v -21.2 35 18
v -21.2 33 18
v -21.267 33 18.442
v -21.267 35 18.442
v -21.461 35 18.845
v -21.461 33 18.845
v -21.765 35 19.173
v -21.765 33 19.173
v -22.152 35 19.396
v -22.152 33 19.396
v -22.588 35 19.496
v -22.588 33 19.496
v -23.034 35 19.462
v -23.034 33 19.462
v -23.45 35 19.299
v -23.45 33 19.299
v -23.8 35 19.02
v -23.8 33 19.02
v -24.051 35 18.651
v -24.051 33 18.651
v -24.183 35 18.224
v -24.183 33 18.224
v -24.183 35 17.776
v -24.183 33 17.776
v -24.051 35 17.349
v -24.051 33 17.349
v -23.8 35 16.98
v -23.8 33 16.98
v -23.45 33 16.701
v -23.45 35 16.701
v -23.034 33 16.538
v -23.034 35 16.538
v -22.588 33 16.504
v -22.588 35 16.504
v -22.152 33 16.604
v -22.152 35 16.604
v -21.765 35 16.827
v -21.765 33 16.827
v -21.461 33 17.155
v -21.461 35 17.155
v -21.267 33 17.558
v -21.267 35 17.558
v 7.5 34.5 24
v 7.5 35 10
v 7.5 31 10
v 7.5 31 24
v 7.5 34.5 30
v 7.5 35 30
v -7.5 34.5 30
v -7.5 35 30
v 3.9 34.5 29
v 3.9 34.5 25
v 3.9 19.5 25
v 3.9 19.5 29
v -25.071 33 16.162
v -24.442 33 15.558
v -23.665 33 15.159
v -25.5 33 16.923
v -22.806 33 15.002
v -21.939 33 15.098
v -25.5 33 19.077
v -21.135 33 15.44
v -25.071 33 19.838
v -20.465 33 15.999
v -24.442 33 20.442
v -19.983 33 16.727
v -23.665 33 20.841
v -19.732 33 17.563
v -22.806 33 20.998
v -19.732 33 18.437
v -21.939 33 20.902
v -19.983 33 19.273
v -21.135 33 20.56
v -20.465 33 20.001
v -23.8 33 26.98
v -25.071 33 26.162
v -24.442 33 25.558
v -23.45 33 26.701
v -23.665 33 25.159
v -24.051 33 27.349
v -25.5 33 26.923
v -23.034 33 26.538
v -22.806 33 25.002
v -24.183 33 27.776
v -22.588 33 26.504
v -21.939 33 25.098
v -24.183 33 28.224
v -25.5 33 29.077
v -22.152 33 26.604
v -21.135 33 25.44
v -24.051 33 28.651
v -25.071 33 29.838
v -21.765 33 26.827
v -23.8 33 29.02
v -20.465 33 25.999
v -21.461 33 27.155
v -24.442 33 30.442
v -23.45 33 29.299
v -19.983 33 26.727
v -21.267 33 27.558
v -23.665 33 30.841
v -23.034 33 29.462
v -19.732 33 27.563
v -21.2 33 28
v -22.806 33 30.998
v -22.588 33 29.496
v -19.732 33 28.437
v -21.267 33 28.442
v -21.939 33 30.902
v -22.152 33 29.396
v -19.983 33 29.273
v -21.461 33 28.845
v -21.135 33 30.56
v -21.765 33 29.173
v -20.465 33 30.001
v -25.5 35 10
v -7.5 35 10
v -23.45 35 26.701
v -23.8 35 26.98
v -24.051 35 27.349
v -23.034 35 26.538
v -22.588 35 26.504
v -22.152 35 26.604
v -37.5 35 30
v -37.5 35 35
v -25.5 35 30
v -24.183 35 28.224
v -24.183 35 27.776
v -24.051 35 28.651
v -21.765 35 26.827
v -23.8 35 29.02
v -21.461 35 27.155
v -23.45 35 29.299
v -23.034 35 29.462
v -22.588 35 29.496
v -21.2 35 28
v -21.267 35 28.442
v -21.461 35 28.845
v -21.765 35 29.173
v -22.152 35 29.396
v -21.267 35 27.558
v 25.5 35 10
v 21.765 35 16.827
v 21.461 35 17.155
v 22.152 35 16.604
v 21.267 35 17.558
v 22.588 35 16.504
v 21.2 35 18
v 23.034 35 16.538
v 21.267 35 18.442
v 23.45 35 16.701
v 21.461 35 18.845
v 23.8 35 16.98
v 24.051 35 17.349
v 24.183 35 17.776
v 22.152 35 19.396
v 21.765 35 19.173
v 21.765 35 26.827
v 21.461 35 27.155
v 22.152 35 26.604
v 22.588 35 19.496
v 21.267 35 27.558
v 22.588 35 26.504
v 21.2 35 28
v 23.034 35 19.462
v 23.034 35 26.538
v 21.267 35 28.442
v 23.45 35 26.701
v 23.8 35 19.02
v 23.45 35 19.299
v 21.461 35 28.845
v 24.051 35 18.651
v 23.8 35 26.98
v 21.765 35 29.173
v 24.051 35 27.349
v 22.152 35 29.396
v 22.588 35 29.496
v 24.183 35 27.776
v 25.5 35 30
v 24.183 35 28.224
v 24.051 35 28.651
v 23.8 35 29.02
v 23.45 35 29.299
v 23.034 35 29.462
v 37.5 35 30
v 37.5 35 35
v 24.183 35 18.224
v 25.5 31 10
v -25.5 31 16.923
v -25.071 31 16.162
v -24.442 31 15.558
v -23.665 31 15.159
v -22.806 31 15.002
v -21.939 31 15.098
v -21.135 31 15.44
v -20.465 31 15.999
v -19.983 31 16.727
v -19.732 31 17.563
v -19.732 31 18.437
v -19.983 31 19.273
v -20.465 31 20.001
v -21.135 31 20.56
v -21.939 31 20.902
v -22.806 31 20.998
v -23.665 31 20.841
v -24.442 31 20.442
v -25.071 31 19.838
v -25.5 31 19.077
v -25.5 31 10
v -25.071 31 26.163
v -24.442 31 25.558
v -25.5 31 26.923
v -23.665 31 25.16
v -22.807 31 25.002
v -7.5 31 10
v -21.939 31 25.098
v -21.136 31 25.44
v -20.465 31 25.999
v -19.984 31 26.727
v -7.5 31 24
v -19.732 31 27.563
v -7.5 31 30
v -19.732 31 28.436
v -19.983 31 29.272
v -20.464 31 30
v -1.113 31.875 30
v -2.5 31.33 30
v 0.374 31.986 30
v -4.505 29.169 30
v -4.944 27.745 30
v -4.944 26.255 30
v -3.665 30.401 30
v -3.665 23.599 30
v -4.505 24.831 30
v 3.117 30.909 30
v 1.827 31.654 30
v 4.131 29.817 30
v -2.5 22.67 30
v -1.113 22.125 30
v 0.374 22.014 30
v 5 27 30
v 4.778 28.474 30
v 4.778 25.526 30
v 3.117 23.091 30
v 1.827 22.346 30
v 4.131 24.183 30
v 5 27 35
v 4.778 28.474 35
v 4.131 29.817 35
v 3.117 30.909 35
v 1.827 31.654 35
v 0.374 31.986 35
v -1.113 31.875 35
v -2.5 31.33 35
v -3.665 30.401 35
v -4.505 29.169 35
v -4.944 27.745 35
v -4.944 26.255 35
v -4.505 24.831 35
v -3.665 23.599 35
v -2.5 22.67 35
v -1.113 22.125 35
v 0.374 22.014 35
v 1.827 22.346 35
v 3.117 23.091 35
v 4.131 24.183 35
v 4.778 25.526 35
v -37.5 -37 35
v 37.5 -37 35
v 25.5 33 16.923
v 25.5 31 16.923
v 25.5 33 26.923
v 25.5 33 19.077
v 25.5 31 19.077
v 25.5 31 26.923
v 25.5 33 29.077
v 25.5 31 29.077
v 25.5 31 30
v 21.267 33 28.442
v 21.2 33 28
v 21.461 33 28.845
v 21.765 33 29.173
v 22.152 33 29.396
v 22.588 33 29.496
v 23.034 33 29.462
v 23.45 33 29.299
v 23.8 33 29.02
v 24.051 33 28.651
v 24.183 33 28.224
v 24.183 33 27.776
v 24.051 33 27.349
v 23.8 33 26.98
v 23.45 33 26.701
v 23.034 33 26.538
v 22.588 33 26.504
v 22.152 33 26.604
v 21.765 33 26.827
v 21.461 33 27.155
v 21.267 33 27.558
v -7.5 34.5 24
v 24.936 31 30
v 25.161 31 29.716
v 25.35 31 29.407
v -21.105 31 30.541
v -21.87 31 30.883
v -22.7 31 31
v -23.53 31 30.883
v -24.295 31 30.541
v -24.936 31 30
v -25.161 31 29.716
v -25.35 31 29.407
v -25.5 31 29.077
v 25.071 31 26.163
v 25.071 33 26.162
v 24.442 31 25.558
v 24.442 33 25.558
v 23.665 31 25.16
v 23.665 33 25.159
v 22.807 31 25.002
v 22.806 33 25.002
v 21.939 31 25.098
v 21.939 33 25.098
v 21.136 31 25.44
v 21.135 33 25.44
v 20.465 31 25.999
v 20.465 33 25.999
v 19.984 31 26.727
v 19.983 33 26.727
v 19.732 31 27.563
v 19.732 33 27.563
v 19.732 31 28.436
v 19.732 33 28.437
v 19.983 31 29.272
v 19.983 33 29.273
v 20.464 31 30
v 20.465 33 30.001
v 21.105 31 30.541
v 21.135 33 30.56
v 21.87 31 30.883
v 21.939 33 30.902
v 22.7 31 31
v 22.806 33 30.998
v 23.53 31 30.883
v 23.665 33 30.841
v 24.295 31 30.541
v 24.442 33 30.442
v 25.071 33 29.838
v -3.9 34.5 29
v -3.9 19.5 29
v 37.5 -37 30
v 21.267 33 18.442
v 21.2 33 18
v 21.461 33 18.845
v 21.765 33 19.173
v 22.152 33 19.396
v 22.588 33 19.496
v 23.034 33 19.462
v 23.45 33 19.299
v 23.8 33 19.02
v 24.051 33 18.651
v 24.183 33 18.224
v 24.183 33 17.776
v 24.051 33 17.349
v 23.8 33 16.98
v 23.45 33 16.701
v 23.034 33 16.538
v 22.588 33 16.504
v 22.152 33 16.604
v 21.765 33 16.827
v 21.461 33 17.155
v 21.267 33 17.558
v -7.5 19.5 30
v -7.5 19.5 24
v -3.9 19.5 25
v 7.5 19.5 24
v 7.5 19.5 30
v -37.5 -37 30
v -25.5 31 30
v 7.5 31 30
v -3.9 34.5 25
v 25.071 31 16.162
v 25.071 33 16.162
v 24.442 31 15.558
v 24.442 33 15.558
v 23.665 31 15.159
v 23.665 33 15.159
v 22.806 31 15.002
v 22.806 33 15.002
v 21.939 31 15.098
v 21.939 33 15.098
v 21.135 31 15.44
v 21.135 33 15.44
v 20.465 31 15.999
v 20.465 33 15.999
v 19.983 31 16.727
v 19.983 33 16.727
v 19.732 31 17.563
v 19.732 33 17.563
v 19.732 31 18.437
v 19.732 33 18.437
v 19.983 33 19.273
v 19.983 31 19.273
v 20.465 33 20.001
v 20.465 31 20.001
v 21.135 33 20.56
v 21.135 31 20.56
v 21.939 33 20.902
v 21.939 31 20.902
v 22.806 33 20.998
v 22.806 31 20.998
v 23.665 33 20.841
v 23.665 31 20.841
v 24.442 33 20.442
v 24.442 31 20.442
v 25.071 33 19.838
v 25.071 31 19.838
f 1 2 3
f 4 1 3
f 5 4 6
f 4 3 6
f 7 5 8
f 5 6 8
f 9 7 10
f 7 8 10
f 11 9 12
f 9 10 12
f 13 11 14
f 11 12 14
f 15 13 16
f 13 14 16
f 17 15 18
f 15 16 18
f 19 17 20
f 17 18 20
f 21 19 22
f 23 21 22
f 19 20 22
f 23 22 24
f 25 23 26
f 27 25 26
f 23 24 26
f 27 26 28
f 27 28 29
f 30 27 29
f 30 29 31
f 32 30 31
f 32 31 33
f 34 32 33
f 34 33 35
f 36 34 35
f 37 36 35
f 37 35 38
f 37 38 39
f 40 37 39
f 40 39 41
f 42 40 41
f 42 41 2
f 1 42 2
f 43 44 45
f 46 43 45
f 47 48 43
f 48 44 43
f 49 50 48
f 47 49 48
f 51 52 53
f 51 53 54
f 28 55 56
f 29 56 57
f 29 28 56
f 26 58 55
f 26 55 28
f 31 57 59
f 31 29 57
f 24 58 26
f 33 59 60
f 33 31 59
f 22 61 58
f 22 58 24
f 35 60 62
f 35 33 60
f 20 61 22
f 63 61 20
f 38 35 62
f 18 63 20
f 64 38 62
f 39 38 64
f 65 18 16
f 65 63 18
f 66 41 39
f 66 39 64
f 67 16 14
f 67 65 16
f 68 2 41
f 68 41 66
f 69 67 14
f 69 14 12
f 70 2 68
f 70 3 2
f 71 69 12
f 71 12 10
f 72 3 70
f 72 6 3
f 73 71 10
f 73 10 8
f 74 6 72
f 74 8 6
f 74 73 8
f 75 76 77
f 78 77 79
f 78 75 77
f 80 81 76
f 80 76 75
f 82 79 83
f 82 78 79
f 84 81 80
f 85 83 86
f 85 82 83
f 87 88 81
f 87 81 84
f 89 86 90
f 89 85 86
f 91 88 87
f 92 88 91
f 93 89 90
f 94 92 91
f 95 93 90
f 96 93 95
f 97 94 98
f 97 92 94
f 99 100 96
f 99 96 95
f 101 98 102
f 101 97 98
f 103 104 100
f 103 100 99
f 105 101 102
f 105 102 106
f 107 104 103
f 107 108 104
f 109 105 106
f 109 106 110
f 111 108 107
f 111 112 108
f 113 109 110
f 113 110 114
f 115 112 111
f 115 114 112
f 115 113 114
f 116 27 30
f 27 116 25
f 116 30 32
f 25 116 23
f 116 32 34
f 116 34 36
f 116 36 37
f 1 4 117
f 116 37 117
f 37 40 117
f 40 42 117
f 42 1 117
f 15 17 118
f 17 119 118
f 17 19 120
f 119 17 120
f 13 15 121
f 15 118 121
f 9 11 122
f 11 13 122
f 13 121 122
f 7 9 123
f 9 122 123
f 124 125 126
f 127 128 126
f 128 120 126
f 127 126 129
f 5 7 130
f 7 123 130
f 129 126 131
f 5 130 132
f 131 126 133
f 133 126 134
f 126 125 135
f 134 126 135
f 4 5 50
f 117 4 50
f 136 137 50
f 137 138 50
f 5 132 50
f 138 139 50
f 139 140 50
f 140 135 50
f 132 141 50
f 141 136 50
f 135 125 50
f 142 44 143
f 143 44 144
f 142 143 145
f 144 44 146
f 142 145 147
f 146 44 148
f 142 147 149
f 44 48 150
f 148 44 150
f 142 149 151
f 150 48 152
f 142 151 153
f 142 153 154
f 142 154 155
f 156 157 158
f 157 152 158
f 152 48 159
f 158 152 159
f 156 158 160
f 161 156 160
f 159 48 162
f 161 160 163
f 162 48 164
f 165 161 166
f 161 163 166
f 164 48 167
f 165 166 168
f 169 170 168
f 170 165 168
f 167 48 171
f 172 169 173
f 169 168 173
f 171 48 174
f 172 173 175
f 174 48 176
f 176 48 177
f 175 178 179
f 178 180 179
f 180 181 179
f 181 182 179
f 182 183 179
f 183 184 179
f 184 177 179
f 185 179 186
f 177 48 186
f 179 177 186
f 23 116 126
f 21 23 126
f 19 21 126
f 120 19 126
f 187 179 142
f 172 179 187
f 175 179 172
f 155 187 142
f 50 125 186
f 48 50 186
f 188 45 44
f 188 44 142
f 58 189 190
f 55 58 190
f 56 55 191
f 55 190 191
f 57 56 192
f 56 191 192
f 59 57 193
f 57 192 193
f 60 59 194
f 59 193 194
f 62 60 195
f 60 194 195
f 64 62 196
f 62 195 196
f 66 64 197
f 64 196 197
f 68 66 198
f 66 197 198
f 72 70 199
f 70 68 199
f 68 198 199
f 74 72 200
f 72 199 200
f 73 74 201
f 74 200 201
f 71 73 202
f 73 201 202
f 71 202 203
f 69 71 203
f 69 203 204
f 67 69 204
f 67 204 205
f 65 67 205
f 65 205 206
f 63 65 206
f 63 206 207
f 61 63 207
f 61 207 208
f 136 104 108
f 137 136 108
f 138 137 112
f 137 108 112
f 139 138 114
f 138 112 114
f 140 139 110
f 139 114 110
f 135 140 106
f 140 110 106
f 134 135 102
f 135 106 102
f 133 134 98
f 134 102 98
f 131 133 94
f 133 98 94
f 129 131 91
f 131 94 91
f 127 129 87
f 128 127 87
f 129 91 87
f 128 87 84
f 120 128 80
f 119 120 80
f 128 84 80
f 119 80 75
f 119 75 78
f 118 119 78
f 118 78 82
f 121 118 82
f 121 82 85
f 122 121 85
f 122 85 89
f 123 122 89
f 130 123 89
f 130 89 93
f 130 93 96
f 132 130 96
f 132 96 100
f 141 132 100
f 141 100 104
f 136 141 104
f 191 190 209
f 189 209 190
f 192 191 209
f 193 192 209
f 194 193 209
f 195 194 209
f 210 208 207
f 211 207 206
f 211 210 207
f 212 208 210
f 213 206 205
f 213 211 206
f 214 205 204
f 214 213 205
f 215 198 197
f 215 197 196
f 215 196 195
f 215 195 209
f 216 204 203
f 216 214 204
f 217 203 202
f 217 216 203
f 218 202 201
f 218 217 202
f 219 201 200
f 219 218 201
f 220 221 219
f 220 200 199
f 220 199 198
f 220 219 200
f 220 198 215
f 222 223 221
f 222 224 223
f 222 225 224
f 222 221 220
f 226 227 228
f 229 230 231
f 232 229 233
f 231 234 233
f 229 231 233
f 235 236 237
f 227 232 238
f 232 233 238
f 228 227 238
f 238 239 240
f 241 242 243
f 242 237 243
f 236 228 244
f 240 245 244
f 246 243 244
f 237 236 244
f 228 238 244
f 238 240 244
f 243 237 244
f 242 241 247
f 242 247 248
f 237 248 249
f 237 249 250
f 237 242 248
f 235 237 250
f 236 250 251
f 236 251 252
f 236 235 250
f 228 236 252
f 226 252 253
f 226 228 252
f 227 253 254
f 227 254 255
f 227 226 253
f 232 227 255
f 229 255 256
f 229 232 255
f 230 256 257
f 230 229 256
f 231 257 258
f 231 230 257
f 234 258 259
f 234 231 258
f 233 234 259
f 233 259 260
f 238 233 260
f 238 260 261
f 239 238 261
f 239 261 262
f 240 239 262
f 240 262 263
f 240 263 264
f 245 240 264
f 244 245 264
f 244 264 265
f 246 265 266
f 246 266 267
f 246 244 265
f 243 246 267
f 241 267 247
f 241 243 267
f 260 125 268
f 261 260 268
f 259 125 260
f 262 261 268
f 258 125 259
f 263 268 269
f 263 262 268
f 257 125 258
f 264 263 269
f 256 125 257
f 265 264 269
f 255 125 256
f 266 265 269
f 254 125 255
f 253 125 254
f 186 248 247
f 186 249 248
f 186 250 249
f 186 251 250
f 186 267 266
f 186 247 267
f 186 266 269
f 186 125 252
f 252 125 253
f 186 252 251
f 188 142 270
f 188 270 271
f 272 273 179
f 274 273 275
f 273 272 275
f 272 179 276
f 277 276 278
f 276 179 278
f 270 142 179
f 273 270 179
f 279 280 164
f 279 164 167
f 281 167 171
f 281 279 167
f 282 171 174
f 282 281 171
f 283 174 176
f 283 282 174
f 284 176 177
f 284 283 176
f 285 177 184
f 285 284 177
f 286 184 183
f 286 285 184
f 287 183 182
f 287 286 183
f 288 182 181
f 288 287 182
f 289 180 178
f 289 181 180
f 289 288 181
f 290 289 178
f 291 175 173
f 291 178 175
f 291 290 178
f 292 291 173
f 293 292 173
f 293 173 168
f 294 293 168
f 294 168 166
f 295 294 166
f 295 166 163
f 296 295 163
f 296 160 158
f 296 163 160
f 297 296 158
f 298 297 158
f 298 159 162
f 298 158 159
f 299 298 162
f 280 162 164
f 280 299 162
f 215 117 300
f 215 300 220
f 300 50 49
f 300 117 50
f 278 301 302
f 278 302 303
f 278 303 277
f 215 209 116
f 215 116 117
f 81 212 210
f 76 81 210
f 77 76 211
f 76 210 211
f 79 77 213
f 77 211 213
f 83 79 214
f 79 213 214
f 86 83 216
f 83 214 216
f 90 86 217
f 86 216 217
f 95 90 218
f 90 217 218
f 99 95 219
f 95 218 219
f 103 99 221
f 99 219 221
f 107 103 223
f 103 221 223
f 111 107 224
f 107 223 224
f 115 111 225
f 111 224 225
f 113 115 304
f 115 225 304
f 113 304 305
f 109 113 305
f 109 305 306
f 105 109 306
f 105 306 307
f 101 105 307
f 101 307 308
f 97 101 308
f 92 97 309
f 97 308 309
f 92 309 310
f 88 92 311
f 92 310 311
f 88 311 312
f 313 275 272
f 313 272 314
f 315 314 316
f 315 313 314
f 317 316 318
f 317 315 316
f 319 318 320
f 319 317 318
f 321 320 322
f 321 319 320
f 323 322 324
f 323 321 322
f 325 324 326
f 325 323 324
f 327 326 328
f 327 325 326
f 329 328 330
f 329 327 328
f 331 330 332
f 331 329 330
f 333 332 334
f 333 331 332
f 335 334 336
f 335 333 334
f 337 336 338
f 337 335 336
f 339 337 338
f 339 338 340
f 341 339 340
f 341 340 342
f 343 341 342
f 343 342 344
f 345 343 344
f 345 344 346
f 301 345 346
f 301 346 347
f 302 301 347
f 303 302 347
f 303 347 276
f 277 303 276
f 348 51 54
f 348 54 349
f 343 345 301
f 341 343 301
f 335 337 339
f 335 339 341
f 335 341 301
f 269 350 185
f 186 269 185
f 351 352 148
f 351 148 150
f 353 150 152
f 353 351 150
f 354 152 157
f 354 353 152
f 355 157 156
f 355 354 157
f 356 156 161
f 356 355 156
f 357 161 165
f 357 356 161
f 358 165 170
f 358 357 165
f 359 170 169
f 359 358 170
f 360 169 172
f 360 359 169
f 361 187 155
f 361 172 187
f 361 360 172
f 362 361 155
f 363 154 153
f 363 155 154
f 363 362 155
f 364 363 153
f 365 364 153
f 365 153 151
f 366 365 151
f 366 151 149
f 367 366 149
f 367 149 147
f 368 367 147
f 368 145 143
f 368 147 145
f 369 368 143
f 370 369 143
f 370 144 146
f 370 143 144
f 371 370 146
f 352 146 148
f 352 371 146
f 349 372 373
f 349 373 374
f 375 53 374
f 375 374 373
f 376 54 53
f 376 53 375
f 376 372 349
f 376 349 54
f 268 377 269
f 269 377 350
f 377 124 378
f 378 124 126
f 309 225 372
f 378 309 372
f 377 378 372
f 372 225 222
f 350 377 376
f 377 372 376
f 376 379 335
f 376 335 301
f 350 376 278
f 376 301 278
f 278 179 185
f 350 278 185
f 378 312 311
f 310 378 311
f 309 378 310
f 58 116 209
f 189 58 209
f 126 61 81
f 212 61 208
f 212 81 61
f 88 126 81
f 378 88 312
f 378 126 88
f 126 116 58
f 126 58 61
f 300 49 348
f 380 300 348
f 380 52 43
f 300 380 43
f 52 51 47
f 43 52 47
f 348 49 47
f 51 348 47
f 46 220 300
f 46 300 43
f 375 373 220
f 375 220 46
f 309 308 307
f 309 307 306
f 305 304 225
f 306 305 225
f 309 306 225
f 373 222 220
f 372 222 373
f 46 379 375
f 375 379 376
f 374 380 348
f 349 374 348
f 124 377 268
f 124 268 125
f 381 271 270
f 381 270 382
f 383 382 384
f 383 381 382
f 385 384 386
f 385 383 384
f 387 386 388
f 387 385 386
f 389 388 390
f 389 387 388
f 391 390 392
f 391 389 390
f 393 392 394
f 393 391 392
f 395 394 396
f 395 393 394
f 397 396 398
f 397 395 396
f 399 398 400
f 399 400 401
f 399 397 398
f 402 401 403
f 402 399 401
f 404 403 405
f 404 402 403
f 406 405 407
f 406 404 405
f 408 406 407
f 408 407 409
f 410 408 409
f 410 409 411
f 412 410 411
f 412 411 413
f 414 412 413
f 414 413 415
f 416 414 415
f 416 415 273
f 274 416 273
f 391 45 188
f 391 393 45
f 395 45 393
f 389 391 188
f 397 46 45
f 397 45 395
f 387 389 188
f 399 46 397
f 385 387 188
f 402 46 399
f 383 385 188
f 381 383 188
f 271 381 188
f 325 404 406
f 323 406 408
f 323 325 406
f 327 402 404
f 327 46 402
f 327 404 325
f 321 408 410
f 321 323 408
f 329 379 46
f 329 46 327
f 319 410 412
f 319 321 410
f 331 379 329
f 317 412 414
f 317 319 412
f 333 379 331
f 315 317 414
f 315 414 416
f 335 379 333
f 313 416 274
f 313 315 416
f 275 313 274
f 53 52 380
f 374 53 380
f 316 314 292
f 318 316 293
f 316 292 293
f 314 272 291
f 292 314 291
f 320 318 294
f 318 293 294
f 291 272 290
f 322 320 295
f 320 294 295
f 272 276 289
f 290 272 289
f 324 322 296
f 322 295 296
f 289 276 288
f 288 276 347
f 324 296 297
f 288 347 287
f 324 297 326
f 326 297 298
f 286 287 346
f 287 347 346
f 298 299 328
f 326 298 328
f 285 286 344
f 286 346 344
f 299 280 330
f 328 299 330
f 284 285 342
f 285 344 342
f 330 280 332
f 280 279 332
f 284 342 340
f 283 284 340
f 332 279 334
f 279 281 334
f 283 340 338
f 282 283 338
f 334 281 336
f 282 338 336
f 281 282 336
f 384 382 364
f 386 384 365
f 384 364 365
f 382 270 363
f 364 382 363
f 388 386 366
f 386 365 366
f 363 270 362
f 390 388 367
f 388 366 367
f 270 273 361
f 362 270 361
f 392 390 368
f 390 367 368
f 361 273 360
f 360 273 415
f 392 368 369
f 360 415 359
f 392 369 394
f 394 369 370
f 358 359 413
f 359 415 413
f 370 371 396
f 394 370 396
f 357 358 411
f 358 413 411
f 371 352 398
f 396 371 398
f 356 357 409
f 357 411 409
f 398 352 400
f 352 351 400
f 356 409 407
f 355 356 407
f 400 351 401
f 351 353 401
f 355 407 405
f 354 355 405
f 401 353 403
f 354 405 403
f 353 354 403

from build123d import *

# Parameters (mm, degrees)
SKETCH074_W     = 75
SKETCH074_H     = 72
SKETCH074_R     = 5
PAD027_DEPTH    = 5
SKETCH076_W     = 15
SKETCH076_H     = 15
PAD029_DEPTH    = 6
SKETCH077_W     = 7.8
SKETCH077_H     = 4
POCKET047_DEPTH = 15
SKETCH086_W     = 18
SKETCH086_H     = 4
PAD033_DEPTH    = 20
SKETCH087_R     = 1.5
POCKET053_DEPTH = 5
SKETCH088_R     = 3
POCKET054_DEPTH = 2


with BuildPart() as part:
    # Sketch074 → Pad027 (new body)
    with BuildSketch(Plane.XY):
        with Locations((0, -1)):
            Rectangle(SKETCH074_W, SKETCH074_H)
        with Locations((0, 27)):
            Circle(SKETCH074_R, mode=Mode.SUBTRACT)
    extrude(amount=PAD027_DEPTH)

    # Sketch076 → Pad029 (join)
    with BuildSketch(Plane(origin=(0, 0, 0), x_dir=(1, 0, 0), z_dir=(0, 0, -1))):
        with Locations((0, -27)):
            Rectangle(SKETCH076_W, SKETCH076_H)
    extrude(amount=PAD029_DEPTH)

    # Sketch077 (on Face8 of Pad029) → Pocket047 (cut)
    with BuildSketch(Plane(origin=(0, 34.5, 0), x_dir=(-1, 0, 0), z_dir=(0, 1, 0))):
        with Locations((0, -3)):
            Rectangle(SKETCH077_W, SKETCH077_H)
    extrude(amount=-POCKET047_DEPTH, mode=Mode.SUBTRACT)

    # Sketch086 (on Face4 of Pocket047) → Pad033 (join)
    with BuildSketch(Plane(origin=(0, 0, 0), x_dir=(1, 0, 0), z_dir=(0, 0, -1))):
        with Locations((-16.5, -33)):
            Rectangle(SKETCH086_W, SKETCH086_H)
        with Locations((16.5, -33)):
            Rectangle(SKETCH086_W, SKETCH086_H)
    extrude(amount=PAD033_DEPTH)

    # Sketch087 (on Face15 of Pad033) → Pocket053 (cut)
    with BuildSketch(Plane.XZ.offset(-31)):
        with Locations((-22.7, -2)):
            Circle(SKETCH087_R)
        with Locations((-22.7, -12)):
            Circle(SKETCH087_R)
    pocket053 = extrude(amount=-POCKET053_DEPTH, mode=Mode.SUBTRACT)

    # Sketch088 (on Face15 of Pocket053) → Pocket054 (cut)
    with BuildSketch(Plane.XZ.offset(-31)):
        with Locations((-22.7, -2)):
            Circle(SKETCH088_R)
        with Locations((-22.7, -12)):
            Circle(SKETCH088_R)
    pocket054 = extrude(amount=-POCKET054_DEPTH, mode=Mode.SUBTRACT)

    # Mirrored004: Pocket053, Pocket054 across Sketch087 V_Axis
    add(pocket053.mirror(Plane(origin=(0, 31, 0), x_dir=(0, -1, 0), z_dir=(1, 0, 0))), mode=Mode.SUBTRACT)
    add(pocket054.mirror(Plane(origin=(0, 31, 0), x_dir=(0, -1, 0), z_dir=(1, 0, 0))), mode=Mode.SUBTRACT)


with BuildPart() as part_1:
    # Body010 placement: moved
    add(part.part.moved(Location((0, 0, 30))))


solid = part_1.part
